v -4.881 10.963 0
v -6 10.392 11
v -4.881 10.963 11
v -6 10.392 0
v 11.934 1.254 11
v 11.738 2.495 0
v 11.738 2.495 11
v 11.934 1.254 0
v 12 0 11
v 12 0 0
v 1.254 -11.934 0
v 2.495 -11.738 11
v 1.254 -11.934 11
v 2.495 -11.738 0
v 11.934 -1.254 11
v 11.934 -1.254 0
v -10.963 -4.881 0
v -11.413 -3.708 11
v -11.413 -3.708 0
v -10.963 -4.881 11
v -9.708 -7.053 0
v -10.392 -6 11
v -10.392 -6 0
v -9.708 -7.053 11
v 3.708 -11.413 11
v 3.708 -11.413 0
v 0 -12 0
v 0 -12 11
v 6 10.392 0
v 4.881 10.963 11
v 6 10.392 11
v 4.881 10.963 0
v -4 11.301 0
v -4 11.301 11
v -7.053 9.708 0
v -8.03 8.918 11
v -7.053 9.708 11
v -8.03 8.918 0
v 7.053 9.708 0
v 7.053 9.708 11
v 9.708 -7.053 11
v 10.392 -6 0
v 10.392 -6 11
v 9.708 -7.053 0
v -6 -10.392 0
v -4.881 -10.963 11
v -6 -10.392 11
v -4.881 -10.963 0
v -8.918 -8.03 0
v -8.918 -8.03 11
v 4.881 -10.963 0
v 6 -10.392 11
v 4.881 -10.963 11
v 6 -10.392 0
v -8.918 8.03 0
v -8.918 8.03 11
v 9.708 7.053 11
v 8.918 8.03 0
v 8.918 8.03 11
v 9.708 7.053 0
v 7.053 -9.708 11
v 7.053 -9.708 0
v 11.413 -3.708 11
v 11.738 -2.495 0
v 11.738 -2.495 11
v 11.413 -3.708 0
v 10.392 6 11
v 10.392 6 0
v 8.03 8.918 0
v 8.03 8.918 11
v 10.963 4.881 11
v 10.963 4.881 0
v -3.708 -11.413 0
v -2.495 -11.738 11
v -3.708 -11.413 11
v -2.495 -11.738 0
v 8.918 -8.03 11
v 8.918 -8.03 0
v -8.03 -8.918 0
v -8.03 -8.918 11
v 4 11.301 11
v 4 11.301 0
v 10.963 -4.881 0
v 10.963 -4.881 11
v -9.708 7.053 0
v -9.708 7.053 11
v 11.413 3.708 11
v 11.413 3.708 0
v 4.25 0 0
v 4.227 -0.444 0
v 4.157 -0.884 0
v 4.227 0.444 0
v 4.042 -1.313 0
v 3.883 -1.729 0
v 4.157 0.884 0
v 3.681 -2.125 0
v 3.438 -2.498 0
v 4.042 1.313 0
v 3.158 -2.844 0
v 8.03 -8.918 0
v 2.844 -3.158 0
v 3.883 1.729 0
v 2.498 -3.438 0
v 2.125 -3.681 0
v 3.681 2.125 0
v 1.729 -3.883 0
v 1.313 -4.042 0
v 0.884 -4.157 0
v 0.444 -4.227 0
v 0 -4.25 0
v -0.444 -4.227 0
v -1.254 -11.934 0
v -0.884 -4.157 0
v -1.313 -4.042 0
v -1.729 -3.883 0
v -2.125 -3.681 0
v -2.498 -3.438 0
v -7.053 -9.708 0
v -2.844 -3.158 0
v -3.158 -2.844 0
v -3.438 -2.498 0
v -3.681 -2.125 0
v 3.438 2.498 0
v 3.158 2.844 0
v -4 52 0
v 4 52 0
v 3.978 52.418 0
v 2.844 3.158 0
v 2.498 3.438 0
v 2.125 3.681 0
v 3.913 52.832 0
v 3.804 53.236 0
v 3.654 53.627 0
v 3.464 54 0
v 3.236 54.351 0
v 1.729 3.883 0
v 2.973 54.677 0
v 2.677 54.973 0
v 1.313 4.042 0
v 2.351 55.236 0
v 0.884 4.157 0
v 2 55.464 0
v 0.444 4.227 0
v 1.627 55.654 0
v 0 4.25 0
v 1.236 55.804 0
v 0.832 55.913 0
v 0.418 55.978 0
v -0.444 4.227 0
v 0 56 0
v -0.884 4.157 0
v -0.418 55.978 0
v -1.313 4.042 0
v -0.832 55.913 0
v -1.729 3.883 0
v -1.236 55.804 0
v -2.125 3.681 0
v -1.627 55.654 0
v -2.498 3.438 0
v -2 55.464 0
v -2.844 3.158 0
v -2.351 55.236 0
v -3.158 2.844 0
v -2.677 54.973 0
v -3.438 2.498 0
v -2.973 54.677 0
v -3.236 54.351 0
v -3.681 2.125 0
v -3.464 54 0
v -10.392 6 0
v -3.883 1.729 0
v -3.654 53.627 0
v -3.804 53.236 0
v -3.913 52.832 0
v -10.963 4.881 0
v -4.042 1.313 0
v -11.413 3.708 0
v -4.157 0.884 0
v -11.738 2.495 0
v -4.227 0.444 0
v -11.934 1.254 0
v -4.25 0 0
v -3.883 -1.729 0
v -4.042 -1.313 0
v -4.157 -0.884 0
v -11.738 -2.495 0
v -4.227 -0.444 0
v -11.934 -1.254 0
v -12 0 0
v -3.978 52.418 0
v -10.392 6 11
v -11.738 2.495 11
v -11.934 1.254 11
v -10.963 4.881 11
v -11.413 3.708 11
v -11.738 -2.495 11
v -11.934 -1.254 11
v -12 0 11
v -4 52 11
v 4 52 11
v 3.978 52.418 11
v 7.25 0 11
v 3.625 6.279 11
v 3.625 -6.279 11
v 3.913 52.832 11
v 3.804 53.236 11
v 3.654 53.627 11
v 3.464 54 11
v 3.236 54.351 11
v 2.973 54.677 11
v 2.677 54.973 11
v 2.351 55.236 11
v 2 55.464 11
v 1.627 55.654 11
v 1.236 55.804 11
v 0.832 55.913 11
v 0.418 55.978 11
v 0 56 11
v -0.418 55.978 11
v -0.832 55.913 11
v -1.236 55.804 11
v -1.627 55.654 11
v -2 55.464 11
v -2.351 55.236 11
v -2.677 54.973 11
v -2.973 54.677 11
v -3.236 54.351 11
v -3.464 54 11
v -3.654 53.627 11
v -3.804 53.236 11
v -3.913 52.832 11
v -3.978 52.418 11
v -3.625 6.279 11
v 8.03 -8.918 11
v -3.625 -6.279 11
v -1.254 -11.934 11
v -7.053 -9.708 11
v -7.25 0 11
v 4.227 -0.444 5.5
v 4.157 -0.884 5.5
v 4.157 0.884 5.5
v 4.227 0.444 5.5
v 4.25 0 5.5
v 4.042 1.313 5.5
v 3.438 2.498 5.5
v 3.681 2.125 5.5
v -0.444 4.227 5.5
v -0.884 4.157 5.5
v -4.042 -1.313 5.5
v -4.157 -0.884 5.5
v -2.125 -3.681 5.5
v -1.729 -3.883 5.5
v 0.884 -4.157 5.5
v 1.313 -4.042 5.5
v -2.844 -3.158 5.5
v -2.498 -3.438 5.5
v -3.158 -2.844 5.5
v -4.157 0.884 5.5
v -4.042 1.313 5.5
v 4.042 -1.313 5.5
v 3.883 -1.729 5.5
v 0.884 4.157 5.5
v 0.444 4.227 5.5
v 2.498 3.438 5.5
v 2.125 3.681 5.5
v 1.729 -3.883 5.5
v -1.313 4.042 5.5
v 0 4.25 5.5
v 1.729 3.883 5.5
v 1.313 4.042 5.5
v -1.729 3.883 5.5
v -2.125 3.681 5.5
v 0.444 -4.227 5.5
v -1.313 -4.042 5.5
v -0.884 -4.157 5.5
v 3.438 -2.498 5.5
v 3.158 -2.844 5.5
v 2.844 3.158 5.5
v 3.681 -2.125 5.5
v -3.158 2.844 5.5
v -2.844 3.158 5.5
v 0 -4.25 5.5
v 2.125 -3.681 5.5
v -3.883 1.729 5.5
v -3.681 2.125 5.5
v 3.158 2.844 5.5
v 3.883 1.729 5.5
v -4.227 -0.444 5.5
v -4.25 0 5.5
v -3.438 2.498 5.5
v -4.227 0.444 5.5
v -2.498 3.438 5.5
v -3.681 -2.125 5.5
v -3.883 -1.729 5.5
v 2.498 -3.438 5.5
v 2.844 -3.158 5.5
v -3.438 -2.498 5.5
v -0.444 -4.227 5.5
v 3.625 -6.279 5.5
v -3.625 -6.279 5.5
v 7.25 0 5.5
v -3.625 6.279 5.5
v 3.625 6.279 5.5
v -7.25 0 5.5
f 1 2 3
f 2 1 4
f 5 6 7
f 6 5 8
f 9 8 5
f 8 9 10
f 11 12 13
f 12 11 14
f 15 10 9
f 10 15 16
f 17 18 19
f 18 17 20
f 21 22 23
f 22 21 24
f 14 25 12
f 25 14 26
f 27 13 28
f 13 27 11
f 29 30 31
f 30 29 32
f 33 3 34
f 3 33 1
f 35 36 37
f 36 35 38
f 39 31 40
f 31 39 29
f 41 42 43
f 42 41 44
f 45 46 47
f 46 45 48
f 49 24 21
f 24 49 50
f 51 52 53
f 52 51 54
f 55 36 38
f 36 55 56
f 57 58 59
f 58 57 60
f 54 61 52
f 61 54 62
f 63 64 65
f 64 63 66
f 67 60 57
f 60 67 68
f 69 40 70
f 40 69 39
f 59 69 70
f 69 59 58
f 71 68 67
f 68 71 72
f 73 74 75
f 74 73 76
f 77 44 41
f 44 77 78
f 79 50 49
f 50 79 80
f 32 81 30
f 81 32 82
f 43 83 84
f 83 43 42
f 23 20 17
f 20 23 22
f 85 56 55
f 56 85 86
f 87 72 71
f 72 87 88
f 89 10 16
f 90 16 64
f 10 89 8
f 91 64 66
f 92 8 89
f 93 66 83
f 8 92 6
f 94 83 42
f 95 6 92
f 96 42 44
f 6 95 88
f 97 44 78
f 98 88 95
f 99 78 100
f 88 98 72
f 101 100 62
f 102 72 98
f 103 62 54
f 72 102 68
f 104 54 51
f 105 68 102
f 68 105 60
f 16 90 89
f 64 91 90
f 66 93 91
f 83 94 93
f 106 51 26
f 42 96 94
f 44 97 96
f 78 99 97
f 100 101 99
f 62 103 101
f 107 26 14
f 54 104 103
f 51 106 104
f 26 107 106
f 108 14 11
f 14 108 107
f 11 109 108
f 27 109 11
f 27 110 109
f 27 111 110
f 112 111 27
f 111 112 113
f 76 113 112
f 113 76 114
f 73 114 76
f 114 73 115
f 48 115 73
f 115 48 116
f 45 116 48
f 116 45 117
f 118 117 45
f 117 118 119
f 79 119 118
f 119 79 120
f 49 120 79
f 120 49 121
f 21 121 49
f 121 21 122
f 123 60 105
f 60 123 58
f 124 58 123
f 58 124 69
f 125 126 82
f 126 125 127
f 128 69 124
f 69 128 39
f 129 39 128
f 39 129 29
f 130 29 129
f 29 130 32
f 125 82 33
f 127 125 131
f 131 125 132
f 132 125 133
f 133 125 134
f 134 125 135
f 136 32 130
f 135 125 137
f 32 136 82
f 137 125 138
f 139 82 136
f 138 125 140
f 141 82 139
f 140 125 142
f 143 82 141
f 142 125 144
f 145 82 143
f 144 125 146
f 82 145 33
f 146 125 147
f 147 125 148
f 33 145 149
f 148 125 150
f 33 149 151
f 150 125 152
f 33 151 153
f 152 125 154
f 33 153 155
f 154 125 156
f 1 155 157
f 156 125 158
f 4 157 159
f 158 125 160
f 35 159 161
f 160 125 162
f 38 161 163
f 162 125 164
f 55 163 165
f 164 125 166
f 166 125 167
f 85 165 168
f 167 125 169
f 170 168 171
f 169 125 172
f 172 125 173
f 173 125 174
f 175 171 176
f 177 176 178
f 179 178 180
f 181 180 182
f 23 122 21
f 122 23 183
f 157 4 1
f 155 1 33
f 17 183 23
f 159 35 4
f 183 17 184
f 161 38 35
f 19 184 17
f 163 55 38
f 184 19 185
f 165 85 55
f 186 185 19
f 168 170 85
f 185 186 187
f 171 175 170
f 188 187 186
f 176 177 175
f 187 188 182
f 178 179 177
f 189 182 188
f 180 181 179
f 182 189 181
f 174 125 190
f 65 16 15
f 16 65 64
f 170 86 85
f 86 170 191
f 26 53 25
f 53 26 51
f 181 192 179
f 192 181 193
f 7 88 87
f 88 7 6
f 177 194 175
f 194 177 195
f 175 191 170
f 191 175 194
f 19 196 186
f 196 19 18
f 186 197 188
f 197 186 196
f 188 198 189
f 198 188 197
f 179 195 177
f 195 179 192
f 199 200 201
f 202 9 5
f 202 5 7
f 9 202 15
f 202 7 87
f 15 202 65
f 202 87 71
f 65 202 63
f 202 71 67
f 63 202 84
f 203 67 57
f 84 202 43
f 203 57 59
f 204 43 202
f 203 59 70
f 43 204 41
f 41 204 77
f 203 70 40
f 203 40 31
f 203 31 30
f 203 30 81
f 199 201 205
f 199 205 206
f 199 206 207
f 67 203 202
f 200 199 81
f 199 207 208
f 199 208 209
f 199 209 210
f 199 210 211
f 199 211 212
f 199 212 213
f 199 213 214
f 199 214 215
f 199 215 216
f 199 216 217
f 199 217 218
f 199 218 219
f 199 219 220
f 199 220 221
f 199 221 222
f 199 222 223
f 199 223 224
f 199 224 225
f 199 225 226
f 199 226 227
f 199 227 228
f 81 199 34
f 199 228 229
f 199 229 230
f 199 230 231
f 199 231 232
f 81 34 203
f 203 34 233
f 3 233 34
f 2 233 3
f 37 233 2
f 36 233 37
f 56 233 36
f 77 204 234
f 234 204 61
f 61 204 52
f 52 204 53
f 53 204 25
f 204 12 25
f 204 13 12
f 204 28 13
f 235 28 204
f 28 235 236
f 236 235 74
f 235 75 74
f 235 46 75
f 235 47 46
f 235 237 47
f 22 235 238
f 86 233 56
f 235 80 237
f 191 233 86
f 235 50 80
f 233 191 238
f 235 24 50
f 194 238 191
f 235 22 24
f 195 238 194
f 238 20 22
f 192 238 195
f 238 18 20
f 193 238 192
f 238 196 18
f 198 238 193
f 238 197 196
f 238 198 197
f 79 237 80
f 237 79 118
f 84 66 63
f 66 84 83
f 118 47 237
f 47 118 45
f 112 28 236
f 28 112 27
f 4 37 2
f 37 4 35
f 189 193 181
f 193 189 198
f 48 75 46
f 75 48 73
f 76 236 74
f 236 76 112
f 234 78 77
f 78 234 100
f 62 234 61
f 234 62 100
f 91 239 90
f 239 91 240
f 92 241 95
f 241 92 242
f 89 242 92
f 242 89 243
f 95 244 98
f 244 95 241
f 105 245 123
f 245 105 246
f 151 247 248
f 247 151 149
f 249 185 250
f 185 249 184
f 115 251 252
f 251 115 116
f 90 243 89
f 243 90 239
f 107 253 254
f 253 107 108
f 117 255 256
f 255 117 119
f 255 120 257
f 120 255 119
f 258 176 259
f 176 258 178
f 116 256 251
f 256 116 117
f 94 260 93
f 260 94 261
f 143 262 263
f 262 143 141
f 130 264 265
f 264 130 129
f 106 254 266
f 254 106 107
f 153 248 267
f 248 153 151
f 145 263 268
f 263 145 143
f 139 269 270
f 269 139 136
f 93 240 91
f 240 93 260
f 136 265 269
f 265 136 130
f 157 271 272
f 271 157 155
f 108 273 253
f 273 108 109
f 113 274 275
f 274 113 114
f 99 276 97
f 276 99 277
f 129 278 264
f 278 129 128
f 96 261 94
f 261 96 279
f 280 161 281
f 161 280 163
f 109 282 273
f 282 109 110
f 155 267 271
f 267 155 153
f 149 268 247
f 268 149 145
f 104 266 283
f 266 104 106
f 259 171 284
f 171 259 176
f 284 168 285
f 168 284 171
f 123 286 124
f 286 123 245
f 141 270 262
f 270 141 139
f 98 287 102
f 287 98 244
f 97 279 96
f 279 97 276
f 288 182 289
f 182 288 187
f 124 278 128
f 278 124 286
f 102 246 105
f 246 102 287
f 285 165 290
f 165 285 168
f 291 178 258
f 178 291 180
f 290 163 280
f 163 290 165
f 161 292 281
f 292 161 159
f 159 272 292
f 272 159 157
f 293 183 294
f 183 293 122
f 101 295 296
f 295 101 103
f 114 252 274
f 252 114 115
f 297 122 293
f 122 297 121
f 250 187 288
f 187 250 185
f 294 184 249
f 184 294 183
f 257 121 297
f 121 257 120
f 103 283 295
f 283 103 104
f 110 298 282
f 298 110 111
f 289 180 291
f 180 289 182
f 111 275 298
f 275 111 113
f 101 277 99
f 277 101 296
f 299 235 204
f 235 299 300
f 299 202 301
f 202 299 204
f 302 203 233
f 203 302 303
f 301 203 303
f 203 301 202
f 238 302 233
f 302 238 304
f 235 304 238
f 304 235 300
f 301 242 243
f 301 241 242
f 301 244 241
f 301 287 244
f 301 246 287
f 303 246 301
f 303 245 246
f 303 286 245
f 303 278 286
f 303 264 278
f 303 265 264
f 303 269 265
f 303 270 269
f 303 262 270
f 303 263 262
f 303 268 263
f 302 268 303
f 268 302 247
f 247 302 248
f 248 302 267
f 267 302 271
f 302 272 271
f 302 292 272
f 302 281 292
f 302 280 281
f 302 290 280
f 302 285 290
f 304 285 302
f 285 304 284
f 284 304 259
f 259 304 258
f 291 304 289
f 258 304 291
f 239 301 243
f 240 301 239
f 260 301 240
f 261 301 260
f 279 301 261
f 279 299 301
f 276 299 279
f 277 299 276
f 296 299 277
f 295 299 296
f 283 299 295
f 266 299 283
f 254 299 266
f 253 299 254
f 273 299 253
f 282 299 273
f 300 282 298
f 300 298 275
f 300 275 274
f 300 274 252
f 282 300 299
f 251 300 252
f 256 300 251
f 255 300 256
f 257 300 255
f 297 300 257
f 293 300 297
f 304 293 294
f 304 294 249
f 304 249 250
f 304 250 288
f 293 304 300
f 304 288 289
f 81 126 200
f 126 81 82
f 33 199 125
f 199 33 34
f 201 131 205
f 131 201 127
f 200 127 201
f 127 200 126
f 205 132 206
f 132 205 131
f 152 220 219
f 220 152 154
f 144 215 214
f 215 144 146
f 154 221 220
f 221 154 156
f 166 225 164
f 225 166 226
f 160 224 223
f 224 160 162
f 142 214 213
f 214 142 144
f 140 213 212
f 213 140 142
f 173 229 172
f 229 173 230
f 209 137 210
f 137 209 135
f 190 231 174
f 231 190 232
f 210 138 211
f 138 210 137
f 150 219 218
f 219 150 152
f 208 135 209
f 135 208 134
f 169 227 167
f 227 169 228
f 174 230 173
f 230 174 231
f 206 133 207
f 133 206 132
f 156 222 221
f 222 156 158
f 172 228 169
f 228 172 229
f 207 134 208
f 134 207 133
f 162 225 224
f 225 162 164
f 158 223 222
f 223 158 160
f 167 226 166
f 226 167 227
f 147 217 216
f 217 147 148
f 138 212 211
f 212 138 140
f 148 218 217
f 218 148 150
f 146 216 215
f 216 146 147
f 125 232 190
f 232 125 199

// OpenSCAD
dia=24; //diameter of object (min=hex)


hex=14.5; //circumscribed diameter of hexagon
head=5.5; //thickness of hex head/nut

bolt=8; //diameter of bolt
thread=5.5; //thickness around threads

res=60; //round resolutions

handleW=8; //width of handle (min=bolt)
handleL=40; //length of handle minus the round

//Calc
height=head+thread; //total height
boltTol=(.5+bolt); //3D printing tolerance


union(){
        translate ([-handleW/2,(dia/2-2),0]) 
        cube([handleW,handleL+2,height], false);
        translate ([0, handleL+dia/2, 0])
        cylinder (height, d=handleW, $fn=res);
difference(){
difference(){
  cylinder (height, d=dia, $fn=res);
  cylinder (height, d=boltTol, $fn=res);
}
translate ([0,0,thread]) cylinder (head,d=hex, $fn=6);
}
}
